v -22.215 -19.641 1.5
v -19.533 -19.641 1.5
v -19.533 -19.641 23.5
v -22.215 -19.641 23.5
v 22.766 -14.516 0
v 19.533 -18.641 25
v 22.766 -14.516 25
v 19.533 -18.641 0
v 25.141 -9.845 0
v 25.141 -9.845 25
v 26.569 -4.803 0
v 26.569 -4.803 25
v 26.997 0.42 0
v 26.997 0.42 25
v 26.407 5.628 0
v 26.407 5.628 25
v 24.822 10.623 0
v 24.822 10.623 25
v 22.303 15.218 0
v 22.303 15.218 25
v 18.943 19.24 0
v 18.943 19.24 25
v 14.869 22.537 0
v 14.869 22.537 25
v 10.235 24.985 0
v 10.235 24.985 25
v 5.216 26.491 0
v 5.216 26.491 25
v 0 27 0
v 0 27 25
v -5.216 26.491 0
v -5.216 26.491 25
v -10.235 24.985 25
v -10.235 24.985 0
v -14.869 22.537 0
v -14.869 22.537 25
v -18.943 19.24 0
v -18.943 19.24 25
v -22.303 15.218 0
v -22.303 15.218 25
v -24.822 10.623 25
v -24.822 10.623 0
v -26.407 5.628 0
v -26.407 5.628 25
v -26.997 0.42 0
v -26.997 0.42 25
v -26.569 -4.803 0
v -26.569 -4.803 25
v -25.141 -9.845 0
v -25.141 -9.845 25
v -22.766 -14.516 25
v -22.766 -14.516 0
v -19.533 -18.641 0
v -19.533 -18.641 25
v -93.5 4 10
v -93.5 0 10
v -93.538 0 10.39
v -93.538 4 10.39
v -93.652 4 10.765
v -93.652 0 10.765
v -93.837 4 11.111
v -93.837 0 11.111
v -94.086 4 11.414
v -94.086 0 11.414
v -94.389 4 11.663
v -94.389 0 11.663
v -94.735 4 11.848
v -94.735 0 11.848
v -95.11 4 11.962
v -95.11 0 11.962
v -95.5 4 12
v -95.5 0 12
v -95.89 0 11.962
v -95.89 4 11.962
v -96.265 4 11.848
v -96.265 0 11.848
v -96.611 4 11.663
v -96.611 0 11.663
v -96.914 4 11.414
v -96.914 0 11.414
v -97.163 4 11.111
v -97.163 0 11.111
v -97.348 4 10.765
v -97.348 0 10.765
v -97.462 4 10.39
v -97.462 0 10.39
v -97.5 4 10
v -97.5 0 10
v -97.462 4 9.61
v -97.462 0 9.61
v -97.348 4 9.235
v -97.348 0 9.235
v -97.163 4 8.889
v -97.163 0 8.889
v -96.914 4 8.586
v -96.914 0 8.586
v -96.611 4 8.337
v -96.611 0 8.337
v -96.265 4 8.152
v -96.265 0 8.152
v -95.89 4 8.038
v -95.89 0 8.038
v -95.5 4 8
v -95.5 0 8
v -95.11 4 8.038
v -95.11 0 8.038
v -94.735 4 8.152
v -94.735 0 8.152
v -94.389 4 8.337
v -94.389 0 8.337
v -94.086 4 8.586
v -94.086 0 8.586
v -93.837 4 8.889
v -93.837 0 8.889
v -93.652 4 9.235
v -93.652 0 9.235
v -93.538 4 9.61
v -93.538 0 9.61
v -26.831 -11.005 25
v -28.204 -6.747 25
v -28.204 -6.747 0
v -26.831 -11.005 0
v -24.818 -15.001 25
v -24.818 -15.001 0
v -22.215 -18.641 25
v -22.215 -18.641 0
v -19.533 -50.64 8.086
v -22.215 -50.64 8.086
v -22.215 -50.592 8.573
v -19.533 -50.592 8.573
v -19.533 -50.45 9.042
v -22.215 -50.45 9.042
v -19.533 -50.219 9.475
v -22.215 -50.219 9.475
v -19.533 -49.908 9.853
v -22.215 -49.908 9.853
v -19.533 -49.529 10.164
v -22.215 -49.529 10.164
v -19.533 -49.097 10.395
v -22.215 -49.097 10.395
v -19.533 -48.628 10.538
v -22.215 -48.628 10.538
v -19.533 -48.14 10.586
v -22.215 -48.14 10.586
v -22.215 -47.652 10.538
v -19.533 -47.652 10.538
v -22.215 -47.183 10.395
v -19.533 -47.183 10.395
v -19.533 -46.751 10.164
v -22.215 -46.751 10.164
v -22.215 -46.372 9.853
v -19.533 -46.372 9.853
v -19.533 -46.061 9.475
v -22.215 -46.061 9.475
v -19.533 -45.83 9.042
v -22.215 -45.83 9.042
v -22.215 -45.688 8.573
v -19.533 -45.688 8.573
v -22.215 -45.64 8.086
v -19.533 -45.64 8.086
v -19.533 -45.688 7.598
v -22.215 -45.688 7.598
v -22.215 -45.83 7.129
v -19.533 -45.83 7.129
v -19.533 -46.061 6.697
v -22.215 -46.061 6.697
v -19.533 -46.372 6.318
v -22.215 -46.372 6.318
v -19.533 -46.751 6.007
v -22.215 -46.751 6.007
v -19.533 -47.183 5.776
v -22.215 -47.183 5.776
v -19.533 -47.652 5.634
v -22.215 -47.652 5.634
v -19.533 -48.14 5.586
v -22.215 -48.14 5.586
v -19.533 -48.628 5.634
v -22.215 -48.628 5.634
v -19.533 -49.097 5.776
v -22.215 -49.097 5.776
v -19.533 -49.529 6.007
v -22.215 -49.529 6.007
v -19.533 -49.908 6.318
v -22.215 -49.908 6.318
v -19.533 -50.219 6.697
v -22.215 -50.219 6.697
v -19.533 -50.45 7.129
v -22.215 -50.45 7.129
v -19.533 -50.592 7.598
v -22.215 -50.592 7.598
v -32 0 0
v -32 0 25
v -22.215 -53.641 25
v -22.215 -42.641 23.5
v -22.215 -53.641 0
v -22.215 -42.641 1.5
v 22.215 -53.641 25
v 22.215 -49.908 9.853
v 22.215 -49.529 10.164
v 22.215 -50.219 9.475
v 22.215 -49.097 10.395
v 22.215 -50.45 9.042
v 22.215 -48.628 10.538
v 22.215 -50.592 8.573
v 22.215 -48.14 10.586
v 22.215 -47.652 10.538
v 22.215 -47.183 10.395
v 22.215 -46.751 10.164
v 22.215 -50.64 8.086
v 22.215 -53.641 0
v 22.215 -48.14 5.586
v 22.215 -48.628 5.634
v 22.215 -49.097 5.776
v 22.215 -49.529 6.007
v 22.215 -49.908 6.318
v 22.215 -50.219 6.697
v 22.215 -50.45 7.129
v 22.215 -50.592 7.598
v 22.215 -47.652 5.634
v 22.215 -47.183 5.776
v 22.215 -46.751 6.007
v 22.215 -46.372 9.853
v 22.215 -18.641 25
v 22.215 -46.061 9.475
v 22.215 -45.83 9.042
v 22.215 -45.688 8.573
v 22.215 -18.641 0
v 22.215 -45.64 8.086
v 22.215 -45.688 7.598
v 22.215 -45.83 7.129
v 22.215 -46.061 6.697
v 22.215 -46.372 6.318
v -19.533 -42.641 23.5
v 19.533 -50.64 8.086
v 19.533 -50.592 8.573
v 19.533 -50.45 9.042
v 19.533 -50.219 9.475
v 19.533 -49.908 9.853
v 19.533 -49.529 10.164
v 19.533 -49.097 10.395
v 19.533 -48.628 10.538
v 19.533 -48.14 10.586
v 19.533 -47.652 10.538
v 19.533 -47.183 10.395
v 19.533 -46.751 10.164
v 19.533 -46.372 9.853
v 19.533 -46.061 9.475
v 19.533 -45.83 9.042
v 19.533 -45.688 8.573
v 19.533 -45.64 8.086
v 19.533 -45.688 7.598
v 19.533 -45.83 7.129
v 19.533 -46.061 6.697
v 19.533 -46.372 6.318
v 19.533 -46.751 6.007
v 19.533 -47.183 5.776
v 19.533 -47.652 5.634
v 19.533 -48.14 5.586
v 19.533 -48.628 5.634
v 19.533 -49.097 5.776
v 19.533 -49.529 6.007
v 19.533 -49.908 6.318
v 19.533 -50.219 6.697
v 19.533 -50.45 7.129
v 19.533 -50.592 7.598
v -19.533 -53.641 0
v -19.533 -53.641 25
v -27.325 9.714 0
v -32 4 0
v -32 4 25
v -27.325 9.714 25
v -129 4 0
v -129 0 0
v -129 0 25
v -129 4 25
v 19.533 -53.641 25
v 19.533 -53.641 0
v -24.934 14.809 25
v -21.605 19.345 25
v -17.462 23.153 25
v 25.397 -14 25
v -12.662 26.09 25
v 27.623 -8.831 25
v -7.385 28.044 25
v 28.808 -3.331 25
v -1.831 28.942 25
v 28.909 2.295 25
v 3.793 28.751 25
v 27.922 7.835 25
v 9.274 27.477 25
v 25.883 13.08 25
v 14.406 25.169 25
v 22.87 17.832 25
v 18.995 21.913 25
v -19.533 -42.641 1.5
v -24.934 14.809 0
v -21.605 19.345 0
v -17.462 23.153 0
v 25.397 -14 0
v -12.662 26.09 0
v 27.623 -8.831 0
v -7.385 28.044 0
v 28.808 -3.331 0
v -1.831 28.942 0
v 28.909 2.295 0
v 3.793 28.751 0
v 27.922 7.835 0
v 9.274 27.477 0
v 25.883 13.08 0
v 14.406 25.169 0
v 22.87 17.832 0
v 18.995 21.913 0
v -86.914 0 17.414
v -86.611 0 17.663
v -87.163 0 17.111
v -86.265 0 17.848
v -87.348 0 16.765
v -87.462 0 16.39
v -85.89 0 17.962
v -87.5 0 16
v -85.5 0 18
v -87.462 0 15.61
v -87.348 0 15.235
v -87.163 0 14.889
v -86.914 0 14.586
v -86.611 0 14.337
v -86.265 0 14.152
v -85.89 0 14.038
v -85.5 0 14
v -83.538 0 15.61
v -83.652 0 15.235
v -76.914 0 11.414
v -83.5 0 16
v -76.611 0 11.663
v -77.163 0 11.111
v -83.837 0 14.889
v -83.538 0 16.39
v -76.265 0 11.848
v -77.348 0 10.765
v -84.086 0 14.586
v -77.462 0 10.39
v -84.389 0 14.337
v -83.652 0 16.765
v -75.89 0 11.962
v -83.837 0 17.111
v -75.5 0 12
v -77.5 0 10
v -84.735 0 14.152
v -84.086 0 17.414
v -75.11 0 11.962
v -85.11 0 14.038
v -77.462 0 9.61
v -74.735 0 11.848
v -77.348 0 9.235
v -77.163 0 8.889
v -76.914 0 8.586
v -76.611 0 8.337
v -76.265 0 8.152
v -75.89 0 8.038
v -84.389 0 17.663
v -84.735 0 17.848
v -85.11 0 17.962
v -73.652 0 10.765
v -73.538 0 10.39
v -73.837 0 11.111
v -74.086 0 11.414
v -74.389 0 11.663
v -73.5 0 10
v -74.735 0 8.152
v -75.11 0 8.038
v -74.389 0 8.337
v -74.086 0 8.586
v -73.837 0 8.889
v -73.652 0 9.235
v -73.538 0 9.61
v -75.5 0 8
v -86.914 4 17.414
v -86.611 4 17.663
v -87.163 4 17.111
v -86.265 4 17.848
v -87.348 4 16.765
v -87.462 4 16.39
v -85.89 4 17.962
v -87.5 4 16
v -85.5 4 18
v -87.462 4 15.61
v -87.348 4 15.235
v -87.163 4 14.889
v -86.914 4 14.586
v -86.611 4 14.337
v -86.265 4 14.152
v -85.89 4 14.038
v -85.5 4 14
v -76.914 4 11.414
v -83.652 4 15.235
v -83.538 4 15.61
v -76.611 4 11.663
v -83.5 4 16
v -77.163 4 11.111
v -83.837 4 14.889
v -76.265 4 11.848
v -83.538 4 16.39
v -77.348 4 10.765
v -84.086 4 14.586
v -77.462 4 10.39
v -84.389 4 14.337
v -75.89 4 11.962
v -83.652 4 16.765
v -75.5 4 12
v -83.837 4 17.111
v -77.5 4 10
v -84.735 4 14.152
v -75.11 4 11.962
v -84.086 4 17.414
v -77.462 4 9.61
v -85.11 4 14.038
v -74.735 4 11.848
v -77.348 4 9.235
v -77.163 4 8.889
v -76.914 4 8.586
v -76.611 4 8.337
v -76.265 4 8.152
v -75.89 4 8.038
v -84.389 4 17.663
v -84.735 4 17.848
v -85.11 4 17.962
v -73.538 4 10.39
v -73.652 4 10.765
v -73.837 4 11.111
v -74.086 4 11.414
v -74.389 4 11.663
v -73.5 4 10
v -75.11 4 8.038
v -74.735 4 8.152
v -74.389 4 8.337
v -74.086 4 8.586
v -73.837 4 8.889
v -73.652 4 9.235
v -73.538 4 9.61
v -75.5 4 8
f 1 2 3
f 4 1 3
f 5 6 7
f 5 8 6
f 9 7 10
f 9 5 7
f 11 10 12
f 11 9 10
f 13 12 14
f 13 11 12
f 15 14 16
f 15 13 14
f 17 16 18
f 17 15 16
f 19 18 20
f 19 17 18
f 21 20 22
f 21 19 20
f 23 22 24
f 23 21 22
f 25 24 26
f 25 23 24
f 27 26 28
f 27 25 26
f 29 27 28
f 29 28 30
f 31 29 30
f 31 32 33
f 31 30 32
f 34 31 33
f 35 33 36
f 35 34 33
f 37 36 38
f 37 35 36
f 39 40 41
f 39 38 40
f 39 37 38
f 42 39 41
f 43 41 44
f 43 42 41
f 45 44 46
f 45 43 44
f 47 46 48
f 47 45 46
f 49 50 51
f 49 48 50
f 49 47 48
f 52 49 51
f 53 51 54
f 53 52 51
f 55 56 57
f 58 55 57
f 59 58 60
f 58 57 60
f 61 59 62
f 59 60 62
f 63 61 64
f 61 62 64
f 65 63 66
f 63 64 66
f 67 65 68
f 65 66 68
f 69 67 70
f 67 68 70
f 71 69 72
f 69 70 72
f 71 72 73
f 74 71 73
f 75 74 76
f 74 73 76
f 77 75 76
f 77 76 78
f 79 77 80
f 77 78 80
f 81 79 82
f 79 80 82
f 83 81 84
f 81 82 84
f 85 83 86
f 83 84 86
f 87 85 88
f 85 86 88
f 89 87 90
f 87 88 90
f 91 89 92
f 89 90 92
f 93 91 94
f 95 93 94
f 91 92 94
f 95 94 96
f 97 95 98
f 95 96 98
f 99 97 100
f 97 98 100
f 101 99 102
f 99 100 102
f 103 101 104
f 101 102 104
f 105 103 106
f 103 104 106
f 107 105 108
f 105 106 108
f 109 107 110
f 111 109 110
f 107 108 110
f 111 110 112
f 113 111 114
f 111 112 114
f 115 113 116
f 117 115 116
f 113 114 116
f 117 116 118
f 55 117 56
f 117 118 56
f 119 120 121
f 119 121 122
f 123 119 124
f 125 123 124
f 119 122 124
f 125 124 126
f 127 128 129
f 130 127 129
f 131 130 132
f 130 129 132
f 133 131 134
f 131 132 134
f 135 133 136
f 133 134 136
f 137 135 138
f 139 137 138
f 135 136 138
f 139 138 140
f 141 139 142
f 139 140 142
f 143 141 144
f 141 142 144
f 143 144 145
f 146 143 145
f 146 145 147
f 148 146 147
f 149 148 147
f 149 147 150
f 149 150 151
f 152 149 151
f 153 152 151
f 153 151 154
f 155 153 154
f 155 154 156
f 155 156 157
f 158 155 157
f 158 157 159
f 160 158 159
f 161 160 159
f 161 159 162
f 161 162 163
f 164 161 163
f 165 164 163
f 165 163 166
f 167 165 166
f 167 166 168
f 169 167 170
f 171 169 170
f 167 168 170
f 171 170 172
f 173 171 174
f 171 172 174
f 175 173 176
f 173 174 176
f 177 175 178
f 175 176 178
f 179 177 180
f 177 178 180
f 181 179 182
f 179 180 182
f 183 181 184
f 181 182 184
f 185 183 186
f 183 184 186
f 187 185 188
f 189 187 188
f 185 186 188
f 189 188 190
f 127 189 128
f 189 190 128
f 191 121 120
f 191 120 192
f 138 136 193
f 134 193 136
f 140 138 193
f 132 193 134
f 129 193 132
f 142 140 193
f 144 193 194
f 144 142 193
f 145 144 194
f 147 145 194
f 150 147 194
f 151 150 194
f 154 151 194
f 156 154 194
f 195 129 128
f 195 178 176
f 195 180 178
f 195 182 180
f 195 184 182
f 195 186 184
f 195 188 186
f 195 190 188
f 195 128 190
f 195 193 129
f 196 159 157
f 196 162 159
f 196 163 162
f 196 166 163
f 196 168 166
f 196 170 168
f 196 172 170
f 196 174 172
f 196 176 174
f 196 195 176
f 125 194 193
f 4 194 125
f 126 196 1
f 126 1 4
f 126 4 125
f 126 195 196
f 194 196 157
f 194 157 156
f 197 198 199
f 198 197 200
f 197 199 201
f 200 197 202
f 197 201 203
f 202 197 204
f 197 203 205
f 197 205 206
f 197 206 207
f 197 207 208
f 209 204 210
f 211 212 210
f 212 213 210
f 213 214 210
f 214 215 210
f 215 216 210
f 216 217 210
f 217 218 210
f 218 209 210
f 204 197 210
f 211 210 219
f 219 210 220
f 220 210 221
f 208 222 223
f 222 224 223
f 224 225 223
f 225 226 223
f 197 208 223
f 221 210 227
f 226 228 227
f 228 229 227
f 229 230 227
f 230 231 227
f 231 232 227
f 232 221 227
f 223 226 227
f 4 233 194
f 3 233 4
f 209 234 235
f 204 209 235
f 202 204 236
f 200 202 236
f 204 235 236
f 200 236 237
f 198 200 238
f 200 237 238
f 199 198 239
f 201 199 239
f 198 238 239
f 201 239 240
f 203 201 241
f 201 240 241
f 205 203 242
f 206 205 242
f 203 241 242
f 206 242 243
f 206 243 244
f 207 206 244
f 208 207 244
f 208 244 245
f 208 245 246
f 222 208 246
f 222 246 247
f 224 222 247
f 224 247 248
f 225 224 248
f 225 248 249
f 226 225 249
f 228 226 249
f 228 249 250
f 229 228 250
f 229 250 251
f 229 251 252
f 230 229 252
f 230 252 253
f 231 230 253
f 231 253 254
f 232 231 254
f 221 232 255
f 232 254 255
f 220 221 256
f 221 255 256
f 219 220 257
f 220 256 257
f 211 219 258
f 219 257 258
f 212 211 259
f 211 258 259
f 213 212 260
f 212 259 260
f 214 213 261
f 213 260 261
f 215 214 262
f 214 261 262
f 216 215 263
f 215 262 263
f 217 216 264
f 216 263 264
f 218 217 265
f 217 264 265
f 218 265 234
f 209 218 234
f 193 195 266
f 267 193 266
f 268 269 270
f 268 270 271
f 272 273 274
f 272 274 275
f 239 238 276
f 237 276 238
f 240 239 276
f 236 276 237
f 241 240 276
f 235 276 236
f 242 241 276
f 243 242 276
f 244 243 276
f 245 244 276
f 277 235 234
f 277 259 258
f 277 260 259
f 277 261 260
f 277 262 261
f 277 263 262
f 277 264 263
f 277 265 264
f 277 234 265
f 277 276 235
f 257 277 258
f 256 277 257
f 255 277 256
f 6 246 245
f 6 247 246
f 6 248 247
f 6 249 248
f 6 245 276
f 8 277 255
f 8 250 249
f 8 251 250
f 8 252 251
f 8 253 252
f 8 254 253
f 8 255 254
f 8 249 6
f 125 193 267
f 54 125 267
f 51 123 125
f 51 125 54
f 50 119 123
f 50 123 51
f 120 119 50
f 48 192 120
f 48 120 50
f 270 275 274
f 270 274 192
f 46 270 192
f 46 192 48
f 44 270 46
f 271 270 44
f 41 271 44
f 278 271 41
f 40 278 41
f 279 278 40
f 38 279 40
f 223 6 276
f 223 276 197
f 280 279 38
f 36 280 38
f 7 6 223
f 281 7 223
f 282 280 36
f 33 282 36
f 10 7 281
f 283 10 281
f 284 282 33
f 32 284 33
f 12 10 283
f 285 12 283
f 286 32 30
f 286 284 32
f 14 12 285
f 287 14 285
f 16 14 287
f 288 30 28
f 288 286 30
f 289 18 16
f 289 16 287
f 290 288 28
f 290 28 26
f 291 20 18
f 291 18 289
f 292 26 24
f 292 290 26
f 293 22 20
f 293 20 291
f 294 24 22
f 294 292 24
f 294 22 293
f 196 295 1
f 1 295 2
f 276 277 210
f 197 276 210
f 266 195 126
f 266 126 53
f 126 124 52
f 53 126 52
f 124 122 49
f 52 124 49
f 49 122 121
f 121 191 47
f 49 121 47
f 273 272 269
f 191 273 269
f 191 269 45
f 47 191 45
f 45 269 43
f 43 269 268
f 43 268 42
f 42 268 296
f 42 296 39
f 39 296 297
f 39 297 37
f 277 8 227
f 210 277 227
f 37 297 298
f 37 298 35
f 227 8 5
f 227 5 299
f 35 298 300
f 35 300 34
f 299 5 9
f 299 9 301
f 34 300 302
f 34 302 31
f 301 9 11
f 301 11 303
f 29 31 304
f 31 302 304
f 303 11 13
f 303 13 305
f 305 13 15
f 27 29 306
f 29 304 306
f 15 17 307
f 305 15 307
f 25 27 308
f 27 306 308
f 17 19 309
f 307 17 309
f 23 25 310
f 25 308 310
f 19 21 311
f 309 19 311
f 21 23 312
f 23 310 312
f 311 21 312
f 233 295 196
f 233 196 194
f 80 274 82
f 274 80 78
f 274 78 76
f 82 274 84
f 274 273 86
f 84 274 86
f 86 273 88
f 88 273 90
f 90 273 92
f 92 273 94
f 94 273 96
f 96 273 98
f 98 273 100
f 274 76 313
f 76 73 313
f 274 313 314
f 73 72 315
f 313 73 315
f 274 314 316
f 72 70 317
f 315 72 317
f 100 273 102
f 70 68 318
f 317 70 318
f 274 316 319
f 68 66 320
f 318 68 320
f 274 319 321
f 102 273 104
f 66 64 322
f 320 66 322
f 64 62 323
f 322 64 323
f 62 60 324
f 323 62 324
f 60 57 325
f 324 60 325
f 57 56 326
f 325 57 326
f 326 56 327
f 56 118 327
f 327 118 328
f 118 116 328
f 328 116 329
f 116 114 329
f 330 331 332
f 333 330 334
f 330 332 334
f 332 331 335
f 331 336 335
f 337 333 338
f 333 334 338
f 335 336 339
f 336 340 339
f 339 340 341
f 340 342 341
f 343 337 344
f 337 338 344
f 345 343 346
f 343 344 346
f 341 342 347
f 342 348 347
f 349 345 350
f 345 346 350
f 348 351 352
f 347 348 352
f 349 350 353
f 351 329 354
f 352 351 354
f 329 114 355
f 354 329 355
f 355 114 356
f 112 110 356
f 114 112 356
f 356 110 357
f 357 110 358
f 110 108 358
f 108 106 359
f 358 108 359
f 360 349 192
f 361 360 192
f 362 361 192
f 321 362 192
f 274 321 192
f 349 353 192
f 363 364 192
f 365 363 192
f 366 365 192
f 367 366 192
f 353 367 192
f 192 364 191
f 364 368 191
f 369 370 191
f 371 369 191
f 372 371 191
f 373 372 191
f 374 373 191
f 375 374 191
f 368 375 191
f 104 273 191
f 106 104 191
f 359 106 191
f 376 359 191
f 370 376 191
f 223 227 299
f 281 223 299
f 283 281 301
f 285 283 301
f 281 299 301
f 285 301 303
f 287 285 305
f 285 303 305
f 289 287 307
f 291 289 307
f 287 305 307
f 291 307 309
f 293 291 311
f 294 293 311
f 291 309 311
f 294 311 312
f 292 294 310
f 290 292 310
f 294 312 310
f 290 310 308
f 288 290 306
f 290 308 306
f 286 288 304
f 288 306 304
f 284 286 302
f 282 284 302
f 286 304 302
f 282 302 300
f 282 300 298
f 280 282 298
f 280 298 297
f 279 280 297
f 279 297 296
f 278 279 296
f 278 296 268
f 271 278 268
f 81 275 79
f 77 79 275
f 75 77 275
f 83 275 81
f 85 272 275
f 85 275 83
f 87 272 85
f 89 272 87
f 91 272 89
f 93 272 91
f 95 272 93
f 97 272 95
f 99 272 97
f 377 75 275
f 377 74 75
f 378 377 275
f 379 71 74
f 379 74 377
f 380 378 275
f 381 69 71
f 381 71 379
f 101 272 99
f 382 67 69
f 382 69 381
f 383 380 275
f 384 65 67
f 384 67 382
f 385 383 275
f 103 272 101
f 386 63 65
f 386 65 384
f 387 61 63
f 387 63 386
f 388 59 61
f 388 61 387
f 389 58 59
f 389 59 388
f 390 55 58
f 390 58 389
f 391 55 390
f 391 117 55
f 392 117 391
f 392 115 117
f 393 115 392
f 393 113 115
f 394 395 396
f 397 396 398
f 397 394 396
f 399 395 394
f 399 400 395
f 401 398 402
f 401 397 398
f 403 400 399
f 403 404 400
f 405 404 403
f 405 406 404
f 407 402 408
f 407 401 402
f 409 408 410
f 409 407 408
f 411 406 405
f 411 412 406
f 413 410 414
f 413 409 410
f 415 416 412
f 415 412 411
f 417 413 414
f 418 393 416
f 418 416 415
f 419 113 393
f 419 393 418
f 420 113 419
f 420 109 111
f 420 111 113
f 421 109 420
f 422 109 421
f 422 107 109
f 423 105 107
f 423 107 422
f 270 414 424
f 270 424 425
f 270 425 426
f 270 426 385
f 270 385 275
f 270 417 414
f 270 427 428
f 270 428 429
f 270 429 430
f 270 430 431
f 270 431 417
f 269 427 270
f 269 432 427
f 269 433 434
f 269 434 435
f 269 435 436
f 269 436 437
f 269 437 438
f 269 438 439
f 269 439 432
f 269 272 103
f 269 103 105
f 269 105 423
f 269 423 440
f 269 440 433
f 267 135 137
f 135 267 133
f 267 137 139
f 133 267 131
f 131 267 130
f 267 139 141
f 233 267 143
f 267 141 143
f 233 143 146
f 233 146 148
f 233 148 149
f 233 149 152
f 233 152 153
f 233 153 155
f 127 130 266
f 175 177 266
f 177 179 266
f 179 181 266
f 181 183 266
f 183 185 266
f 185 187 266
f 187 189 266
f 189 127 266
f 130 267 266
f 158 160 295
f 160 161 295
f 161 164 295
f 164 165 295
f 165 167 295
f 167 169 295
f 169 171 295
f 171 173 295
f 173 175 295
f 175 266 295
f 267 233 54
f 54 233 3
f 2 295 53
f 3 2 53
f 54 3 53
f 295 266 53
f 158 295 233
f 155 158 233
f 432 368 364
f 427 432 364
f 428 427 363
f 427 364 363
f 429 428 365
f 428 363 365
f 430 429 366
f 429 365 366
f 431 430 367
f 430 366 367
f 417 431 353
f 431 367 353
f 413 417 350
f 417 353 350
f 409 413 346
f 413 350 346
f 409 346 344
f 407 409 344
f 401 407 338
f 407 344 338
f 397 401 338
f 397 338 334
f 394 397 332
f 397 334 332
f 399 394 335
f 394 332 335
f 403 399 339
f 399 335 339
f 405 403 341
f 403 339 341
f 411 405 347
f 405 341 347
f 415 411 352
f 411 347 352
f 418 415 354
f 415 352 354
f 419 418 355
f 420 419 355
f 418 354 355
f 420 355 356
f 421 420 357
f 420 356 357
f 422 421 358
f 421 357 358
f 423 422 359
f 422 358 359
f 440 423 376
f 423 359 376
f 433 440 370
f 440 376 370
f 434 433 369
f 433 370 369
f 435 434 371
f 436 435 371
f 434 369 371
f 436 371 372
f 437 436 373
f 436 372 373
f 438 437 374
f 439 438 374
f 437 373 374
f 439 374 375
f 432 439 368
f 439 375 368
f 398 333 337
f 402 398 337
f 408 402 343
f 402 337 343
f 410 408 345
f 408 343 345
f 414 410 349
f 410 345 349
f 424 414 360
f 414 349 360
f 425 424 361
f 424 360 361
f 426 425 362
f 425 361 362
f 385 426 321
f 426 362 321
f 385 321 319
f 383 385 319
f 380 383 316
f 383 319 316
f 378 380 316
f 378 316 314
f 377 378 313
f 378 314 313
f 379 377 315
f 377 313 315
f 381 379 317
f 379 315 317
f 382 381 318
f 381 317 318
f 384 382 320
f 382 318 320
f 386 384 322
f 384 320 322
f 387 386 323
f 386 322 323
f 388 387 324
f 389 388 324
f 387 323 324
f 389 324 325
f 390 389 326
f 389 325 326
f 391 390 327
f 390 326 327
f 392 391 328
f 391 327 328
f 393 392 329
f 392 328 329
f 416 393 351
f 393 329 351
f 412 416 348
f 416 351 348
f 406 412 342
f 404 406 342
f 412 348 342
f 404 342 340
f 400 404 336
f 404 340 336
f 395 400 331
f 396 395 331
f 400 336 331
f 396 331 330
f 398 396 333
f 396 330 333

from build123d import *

# Parameters (mm, degrees)
PAD015_DEPTH    = 25
SKETCH016_R     = 27
POCKET017_DEPTH = 25
SKETCH030_W     = 44.4306459714
SKETCH030_H     = 35
PAD022_DEPTH    = 25
SKETCH031_W     = 39.0651033717
SKETCH031_H     = 35
POCKET021_DEPTH = 36
SKETCH032_W     = 23
SKETCH032_H     = 22
POCKET022_DEPTH = 36
SKETCH041_R     = 2.5
POCKET024_DEPTH = 52.1614566717
SKETCH044_W     = 100
SKETCH044_H     = 4
PAD025_DEPTH    = 25
SKETCH066_R     = 2
POCKET030_DEPTH = 4


with BuildPart() as part:
    # Sketch015 → Pad015 (new body)
    with BuildSketch(Plane.XY):
        with BuildLine():
            ThreePointArc((22.2152888505, -18.6408406809), (0, 29), (-22.2152888505, -18.6408406809))
            Line((-22.2152888505, -18.6408406809), (22.2152888505, -18.6408406809))
        make_face()
    extrude(amount=PAD015_DEPTH)

    # Sketch016 → Pocket017 (cut)
    with BuildSketch(Plane.XY):
        Circle(SKETCH016_R)
    extrude(amount=POCKET017_DEPTH, mode=Mode.SUBTRACT)

    # Sketch030 → Pad022 (join)
    with BuildSketch(Plane.XY):
        with Locations((0, -36.1408)):
            Rectangle(SKETCH030_W, SKETCH030_H)
    extrude(amount=PAD022_DEPTH)

    # Sketch031 → Pocket021 (cut)
    with BuildSketch(Plane.XY):
        with Locations((0, -36.1408)):
            Rectangle(SKETCH031_W, SKETCH031_H)
    extrude(amount=POCKET021_DEPTH, mode=Mode.SUBTRACT)

    # Sketch032 → Pocket022 (cut)
    with BuildSketch(Plane.YZ):
        with Locations((-31.1408, 12.5)):
            Rectangle(SKETCH032_W, SKETCH032_H)
    extrude(amount=-POCKET022_DEPTH, mode=Mode.SUBTRACT)

    # Sketch041 → Pocket024 (cut, through all)
    with BuildSketch(Plane(origin=(-23.1604566717, 0, 0), x_dir=(0, -1, 0), z_dir=(-1, 0, 0))):
        with Locations((48.14, 8.085693)):
            Circle(SKETCH041_R)
    extrude(amount=-POCKET024_DEPTH, mode=Mode.SUBTRACT)

    # Sketch044 → Pad025 (join)
    with BuildSketch(Plane.XY):
        with Locations((-79, 2)):
            Rectangle(SKETCH044_W, SKETCH044_H)
        Polygon((-32, 4), (-27.017239, 10.090035), (-27.680943, -7.676853), (-32, 0), align=None)
    extrude(amount=PAD025_DEPTH)

    # Sketch066 (on Face20 of Pad025) → Pocket030 (cut)
    with BuildSketch(Plane.XZ):
        with Locations((-95.5, 10)):
            Circle(SKETCH066_R)
        with Locations((-85.5, 16)):
            Circle(SKETCH066_R)
        with Locations((-75.5, 10)):
            Circle(SKETCH066_R)
    extrude(amount=-POCKET030_DEPTH, mode=Mode.SUBTRACT)


solid = part.part
